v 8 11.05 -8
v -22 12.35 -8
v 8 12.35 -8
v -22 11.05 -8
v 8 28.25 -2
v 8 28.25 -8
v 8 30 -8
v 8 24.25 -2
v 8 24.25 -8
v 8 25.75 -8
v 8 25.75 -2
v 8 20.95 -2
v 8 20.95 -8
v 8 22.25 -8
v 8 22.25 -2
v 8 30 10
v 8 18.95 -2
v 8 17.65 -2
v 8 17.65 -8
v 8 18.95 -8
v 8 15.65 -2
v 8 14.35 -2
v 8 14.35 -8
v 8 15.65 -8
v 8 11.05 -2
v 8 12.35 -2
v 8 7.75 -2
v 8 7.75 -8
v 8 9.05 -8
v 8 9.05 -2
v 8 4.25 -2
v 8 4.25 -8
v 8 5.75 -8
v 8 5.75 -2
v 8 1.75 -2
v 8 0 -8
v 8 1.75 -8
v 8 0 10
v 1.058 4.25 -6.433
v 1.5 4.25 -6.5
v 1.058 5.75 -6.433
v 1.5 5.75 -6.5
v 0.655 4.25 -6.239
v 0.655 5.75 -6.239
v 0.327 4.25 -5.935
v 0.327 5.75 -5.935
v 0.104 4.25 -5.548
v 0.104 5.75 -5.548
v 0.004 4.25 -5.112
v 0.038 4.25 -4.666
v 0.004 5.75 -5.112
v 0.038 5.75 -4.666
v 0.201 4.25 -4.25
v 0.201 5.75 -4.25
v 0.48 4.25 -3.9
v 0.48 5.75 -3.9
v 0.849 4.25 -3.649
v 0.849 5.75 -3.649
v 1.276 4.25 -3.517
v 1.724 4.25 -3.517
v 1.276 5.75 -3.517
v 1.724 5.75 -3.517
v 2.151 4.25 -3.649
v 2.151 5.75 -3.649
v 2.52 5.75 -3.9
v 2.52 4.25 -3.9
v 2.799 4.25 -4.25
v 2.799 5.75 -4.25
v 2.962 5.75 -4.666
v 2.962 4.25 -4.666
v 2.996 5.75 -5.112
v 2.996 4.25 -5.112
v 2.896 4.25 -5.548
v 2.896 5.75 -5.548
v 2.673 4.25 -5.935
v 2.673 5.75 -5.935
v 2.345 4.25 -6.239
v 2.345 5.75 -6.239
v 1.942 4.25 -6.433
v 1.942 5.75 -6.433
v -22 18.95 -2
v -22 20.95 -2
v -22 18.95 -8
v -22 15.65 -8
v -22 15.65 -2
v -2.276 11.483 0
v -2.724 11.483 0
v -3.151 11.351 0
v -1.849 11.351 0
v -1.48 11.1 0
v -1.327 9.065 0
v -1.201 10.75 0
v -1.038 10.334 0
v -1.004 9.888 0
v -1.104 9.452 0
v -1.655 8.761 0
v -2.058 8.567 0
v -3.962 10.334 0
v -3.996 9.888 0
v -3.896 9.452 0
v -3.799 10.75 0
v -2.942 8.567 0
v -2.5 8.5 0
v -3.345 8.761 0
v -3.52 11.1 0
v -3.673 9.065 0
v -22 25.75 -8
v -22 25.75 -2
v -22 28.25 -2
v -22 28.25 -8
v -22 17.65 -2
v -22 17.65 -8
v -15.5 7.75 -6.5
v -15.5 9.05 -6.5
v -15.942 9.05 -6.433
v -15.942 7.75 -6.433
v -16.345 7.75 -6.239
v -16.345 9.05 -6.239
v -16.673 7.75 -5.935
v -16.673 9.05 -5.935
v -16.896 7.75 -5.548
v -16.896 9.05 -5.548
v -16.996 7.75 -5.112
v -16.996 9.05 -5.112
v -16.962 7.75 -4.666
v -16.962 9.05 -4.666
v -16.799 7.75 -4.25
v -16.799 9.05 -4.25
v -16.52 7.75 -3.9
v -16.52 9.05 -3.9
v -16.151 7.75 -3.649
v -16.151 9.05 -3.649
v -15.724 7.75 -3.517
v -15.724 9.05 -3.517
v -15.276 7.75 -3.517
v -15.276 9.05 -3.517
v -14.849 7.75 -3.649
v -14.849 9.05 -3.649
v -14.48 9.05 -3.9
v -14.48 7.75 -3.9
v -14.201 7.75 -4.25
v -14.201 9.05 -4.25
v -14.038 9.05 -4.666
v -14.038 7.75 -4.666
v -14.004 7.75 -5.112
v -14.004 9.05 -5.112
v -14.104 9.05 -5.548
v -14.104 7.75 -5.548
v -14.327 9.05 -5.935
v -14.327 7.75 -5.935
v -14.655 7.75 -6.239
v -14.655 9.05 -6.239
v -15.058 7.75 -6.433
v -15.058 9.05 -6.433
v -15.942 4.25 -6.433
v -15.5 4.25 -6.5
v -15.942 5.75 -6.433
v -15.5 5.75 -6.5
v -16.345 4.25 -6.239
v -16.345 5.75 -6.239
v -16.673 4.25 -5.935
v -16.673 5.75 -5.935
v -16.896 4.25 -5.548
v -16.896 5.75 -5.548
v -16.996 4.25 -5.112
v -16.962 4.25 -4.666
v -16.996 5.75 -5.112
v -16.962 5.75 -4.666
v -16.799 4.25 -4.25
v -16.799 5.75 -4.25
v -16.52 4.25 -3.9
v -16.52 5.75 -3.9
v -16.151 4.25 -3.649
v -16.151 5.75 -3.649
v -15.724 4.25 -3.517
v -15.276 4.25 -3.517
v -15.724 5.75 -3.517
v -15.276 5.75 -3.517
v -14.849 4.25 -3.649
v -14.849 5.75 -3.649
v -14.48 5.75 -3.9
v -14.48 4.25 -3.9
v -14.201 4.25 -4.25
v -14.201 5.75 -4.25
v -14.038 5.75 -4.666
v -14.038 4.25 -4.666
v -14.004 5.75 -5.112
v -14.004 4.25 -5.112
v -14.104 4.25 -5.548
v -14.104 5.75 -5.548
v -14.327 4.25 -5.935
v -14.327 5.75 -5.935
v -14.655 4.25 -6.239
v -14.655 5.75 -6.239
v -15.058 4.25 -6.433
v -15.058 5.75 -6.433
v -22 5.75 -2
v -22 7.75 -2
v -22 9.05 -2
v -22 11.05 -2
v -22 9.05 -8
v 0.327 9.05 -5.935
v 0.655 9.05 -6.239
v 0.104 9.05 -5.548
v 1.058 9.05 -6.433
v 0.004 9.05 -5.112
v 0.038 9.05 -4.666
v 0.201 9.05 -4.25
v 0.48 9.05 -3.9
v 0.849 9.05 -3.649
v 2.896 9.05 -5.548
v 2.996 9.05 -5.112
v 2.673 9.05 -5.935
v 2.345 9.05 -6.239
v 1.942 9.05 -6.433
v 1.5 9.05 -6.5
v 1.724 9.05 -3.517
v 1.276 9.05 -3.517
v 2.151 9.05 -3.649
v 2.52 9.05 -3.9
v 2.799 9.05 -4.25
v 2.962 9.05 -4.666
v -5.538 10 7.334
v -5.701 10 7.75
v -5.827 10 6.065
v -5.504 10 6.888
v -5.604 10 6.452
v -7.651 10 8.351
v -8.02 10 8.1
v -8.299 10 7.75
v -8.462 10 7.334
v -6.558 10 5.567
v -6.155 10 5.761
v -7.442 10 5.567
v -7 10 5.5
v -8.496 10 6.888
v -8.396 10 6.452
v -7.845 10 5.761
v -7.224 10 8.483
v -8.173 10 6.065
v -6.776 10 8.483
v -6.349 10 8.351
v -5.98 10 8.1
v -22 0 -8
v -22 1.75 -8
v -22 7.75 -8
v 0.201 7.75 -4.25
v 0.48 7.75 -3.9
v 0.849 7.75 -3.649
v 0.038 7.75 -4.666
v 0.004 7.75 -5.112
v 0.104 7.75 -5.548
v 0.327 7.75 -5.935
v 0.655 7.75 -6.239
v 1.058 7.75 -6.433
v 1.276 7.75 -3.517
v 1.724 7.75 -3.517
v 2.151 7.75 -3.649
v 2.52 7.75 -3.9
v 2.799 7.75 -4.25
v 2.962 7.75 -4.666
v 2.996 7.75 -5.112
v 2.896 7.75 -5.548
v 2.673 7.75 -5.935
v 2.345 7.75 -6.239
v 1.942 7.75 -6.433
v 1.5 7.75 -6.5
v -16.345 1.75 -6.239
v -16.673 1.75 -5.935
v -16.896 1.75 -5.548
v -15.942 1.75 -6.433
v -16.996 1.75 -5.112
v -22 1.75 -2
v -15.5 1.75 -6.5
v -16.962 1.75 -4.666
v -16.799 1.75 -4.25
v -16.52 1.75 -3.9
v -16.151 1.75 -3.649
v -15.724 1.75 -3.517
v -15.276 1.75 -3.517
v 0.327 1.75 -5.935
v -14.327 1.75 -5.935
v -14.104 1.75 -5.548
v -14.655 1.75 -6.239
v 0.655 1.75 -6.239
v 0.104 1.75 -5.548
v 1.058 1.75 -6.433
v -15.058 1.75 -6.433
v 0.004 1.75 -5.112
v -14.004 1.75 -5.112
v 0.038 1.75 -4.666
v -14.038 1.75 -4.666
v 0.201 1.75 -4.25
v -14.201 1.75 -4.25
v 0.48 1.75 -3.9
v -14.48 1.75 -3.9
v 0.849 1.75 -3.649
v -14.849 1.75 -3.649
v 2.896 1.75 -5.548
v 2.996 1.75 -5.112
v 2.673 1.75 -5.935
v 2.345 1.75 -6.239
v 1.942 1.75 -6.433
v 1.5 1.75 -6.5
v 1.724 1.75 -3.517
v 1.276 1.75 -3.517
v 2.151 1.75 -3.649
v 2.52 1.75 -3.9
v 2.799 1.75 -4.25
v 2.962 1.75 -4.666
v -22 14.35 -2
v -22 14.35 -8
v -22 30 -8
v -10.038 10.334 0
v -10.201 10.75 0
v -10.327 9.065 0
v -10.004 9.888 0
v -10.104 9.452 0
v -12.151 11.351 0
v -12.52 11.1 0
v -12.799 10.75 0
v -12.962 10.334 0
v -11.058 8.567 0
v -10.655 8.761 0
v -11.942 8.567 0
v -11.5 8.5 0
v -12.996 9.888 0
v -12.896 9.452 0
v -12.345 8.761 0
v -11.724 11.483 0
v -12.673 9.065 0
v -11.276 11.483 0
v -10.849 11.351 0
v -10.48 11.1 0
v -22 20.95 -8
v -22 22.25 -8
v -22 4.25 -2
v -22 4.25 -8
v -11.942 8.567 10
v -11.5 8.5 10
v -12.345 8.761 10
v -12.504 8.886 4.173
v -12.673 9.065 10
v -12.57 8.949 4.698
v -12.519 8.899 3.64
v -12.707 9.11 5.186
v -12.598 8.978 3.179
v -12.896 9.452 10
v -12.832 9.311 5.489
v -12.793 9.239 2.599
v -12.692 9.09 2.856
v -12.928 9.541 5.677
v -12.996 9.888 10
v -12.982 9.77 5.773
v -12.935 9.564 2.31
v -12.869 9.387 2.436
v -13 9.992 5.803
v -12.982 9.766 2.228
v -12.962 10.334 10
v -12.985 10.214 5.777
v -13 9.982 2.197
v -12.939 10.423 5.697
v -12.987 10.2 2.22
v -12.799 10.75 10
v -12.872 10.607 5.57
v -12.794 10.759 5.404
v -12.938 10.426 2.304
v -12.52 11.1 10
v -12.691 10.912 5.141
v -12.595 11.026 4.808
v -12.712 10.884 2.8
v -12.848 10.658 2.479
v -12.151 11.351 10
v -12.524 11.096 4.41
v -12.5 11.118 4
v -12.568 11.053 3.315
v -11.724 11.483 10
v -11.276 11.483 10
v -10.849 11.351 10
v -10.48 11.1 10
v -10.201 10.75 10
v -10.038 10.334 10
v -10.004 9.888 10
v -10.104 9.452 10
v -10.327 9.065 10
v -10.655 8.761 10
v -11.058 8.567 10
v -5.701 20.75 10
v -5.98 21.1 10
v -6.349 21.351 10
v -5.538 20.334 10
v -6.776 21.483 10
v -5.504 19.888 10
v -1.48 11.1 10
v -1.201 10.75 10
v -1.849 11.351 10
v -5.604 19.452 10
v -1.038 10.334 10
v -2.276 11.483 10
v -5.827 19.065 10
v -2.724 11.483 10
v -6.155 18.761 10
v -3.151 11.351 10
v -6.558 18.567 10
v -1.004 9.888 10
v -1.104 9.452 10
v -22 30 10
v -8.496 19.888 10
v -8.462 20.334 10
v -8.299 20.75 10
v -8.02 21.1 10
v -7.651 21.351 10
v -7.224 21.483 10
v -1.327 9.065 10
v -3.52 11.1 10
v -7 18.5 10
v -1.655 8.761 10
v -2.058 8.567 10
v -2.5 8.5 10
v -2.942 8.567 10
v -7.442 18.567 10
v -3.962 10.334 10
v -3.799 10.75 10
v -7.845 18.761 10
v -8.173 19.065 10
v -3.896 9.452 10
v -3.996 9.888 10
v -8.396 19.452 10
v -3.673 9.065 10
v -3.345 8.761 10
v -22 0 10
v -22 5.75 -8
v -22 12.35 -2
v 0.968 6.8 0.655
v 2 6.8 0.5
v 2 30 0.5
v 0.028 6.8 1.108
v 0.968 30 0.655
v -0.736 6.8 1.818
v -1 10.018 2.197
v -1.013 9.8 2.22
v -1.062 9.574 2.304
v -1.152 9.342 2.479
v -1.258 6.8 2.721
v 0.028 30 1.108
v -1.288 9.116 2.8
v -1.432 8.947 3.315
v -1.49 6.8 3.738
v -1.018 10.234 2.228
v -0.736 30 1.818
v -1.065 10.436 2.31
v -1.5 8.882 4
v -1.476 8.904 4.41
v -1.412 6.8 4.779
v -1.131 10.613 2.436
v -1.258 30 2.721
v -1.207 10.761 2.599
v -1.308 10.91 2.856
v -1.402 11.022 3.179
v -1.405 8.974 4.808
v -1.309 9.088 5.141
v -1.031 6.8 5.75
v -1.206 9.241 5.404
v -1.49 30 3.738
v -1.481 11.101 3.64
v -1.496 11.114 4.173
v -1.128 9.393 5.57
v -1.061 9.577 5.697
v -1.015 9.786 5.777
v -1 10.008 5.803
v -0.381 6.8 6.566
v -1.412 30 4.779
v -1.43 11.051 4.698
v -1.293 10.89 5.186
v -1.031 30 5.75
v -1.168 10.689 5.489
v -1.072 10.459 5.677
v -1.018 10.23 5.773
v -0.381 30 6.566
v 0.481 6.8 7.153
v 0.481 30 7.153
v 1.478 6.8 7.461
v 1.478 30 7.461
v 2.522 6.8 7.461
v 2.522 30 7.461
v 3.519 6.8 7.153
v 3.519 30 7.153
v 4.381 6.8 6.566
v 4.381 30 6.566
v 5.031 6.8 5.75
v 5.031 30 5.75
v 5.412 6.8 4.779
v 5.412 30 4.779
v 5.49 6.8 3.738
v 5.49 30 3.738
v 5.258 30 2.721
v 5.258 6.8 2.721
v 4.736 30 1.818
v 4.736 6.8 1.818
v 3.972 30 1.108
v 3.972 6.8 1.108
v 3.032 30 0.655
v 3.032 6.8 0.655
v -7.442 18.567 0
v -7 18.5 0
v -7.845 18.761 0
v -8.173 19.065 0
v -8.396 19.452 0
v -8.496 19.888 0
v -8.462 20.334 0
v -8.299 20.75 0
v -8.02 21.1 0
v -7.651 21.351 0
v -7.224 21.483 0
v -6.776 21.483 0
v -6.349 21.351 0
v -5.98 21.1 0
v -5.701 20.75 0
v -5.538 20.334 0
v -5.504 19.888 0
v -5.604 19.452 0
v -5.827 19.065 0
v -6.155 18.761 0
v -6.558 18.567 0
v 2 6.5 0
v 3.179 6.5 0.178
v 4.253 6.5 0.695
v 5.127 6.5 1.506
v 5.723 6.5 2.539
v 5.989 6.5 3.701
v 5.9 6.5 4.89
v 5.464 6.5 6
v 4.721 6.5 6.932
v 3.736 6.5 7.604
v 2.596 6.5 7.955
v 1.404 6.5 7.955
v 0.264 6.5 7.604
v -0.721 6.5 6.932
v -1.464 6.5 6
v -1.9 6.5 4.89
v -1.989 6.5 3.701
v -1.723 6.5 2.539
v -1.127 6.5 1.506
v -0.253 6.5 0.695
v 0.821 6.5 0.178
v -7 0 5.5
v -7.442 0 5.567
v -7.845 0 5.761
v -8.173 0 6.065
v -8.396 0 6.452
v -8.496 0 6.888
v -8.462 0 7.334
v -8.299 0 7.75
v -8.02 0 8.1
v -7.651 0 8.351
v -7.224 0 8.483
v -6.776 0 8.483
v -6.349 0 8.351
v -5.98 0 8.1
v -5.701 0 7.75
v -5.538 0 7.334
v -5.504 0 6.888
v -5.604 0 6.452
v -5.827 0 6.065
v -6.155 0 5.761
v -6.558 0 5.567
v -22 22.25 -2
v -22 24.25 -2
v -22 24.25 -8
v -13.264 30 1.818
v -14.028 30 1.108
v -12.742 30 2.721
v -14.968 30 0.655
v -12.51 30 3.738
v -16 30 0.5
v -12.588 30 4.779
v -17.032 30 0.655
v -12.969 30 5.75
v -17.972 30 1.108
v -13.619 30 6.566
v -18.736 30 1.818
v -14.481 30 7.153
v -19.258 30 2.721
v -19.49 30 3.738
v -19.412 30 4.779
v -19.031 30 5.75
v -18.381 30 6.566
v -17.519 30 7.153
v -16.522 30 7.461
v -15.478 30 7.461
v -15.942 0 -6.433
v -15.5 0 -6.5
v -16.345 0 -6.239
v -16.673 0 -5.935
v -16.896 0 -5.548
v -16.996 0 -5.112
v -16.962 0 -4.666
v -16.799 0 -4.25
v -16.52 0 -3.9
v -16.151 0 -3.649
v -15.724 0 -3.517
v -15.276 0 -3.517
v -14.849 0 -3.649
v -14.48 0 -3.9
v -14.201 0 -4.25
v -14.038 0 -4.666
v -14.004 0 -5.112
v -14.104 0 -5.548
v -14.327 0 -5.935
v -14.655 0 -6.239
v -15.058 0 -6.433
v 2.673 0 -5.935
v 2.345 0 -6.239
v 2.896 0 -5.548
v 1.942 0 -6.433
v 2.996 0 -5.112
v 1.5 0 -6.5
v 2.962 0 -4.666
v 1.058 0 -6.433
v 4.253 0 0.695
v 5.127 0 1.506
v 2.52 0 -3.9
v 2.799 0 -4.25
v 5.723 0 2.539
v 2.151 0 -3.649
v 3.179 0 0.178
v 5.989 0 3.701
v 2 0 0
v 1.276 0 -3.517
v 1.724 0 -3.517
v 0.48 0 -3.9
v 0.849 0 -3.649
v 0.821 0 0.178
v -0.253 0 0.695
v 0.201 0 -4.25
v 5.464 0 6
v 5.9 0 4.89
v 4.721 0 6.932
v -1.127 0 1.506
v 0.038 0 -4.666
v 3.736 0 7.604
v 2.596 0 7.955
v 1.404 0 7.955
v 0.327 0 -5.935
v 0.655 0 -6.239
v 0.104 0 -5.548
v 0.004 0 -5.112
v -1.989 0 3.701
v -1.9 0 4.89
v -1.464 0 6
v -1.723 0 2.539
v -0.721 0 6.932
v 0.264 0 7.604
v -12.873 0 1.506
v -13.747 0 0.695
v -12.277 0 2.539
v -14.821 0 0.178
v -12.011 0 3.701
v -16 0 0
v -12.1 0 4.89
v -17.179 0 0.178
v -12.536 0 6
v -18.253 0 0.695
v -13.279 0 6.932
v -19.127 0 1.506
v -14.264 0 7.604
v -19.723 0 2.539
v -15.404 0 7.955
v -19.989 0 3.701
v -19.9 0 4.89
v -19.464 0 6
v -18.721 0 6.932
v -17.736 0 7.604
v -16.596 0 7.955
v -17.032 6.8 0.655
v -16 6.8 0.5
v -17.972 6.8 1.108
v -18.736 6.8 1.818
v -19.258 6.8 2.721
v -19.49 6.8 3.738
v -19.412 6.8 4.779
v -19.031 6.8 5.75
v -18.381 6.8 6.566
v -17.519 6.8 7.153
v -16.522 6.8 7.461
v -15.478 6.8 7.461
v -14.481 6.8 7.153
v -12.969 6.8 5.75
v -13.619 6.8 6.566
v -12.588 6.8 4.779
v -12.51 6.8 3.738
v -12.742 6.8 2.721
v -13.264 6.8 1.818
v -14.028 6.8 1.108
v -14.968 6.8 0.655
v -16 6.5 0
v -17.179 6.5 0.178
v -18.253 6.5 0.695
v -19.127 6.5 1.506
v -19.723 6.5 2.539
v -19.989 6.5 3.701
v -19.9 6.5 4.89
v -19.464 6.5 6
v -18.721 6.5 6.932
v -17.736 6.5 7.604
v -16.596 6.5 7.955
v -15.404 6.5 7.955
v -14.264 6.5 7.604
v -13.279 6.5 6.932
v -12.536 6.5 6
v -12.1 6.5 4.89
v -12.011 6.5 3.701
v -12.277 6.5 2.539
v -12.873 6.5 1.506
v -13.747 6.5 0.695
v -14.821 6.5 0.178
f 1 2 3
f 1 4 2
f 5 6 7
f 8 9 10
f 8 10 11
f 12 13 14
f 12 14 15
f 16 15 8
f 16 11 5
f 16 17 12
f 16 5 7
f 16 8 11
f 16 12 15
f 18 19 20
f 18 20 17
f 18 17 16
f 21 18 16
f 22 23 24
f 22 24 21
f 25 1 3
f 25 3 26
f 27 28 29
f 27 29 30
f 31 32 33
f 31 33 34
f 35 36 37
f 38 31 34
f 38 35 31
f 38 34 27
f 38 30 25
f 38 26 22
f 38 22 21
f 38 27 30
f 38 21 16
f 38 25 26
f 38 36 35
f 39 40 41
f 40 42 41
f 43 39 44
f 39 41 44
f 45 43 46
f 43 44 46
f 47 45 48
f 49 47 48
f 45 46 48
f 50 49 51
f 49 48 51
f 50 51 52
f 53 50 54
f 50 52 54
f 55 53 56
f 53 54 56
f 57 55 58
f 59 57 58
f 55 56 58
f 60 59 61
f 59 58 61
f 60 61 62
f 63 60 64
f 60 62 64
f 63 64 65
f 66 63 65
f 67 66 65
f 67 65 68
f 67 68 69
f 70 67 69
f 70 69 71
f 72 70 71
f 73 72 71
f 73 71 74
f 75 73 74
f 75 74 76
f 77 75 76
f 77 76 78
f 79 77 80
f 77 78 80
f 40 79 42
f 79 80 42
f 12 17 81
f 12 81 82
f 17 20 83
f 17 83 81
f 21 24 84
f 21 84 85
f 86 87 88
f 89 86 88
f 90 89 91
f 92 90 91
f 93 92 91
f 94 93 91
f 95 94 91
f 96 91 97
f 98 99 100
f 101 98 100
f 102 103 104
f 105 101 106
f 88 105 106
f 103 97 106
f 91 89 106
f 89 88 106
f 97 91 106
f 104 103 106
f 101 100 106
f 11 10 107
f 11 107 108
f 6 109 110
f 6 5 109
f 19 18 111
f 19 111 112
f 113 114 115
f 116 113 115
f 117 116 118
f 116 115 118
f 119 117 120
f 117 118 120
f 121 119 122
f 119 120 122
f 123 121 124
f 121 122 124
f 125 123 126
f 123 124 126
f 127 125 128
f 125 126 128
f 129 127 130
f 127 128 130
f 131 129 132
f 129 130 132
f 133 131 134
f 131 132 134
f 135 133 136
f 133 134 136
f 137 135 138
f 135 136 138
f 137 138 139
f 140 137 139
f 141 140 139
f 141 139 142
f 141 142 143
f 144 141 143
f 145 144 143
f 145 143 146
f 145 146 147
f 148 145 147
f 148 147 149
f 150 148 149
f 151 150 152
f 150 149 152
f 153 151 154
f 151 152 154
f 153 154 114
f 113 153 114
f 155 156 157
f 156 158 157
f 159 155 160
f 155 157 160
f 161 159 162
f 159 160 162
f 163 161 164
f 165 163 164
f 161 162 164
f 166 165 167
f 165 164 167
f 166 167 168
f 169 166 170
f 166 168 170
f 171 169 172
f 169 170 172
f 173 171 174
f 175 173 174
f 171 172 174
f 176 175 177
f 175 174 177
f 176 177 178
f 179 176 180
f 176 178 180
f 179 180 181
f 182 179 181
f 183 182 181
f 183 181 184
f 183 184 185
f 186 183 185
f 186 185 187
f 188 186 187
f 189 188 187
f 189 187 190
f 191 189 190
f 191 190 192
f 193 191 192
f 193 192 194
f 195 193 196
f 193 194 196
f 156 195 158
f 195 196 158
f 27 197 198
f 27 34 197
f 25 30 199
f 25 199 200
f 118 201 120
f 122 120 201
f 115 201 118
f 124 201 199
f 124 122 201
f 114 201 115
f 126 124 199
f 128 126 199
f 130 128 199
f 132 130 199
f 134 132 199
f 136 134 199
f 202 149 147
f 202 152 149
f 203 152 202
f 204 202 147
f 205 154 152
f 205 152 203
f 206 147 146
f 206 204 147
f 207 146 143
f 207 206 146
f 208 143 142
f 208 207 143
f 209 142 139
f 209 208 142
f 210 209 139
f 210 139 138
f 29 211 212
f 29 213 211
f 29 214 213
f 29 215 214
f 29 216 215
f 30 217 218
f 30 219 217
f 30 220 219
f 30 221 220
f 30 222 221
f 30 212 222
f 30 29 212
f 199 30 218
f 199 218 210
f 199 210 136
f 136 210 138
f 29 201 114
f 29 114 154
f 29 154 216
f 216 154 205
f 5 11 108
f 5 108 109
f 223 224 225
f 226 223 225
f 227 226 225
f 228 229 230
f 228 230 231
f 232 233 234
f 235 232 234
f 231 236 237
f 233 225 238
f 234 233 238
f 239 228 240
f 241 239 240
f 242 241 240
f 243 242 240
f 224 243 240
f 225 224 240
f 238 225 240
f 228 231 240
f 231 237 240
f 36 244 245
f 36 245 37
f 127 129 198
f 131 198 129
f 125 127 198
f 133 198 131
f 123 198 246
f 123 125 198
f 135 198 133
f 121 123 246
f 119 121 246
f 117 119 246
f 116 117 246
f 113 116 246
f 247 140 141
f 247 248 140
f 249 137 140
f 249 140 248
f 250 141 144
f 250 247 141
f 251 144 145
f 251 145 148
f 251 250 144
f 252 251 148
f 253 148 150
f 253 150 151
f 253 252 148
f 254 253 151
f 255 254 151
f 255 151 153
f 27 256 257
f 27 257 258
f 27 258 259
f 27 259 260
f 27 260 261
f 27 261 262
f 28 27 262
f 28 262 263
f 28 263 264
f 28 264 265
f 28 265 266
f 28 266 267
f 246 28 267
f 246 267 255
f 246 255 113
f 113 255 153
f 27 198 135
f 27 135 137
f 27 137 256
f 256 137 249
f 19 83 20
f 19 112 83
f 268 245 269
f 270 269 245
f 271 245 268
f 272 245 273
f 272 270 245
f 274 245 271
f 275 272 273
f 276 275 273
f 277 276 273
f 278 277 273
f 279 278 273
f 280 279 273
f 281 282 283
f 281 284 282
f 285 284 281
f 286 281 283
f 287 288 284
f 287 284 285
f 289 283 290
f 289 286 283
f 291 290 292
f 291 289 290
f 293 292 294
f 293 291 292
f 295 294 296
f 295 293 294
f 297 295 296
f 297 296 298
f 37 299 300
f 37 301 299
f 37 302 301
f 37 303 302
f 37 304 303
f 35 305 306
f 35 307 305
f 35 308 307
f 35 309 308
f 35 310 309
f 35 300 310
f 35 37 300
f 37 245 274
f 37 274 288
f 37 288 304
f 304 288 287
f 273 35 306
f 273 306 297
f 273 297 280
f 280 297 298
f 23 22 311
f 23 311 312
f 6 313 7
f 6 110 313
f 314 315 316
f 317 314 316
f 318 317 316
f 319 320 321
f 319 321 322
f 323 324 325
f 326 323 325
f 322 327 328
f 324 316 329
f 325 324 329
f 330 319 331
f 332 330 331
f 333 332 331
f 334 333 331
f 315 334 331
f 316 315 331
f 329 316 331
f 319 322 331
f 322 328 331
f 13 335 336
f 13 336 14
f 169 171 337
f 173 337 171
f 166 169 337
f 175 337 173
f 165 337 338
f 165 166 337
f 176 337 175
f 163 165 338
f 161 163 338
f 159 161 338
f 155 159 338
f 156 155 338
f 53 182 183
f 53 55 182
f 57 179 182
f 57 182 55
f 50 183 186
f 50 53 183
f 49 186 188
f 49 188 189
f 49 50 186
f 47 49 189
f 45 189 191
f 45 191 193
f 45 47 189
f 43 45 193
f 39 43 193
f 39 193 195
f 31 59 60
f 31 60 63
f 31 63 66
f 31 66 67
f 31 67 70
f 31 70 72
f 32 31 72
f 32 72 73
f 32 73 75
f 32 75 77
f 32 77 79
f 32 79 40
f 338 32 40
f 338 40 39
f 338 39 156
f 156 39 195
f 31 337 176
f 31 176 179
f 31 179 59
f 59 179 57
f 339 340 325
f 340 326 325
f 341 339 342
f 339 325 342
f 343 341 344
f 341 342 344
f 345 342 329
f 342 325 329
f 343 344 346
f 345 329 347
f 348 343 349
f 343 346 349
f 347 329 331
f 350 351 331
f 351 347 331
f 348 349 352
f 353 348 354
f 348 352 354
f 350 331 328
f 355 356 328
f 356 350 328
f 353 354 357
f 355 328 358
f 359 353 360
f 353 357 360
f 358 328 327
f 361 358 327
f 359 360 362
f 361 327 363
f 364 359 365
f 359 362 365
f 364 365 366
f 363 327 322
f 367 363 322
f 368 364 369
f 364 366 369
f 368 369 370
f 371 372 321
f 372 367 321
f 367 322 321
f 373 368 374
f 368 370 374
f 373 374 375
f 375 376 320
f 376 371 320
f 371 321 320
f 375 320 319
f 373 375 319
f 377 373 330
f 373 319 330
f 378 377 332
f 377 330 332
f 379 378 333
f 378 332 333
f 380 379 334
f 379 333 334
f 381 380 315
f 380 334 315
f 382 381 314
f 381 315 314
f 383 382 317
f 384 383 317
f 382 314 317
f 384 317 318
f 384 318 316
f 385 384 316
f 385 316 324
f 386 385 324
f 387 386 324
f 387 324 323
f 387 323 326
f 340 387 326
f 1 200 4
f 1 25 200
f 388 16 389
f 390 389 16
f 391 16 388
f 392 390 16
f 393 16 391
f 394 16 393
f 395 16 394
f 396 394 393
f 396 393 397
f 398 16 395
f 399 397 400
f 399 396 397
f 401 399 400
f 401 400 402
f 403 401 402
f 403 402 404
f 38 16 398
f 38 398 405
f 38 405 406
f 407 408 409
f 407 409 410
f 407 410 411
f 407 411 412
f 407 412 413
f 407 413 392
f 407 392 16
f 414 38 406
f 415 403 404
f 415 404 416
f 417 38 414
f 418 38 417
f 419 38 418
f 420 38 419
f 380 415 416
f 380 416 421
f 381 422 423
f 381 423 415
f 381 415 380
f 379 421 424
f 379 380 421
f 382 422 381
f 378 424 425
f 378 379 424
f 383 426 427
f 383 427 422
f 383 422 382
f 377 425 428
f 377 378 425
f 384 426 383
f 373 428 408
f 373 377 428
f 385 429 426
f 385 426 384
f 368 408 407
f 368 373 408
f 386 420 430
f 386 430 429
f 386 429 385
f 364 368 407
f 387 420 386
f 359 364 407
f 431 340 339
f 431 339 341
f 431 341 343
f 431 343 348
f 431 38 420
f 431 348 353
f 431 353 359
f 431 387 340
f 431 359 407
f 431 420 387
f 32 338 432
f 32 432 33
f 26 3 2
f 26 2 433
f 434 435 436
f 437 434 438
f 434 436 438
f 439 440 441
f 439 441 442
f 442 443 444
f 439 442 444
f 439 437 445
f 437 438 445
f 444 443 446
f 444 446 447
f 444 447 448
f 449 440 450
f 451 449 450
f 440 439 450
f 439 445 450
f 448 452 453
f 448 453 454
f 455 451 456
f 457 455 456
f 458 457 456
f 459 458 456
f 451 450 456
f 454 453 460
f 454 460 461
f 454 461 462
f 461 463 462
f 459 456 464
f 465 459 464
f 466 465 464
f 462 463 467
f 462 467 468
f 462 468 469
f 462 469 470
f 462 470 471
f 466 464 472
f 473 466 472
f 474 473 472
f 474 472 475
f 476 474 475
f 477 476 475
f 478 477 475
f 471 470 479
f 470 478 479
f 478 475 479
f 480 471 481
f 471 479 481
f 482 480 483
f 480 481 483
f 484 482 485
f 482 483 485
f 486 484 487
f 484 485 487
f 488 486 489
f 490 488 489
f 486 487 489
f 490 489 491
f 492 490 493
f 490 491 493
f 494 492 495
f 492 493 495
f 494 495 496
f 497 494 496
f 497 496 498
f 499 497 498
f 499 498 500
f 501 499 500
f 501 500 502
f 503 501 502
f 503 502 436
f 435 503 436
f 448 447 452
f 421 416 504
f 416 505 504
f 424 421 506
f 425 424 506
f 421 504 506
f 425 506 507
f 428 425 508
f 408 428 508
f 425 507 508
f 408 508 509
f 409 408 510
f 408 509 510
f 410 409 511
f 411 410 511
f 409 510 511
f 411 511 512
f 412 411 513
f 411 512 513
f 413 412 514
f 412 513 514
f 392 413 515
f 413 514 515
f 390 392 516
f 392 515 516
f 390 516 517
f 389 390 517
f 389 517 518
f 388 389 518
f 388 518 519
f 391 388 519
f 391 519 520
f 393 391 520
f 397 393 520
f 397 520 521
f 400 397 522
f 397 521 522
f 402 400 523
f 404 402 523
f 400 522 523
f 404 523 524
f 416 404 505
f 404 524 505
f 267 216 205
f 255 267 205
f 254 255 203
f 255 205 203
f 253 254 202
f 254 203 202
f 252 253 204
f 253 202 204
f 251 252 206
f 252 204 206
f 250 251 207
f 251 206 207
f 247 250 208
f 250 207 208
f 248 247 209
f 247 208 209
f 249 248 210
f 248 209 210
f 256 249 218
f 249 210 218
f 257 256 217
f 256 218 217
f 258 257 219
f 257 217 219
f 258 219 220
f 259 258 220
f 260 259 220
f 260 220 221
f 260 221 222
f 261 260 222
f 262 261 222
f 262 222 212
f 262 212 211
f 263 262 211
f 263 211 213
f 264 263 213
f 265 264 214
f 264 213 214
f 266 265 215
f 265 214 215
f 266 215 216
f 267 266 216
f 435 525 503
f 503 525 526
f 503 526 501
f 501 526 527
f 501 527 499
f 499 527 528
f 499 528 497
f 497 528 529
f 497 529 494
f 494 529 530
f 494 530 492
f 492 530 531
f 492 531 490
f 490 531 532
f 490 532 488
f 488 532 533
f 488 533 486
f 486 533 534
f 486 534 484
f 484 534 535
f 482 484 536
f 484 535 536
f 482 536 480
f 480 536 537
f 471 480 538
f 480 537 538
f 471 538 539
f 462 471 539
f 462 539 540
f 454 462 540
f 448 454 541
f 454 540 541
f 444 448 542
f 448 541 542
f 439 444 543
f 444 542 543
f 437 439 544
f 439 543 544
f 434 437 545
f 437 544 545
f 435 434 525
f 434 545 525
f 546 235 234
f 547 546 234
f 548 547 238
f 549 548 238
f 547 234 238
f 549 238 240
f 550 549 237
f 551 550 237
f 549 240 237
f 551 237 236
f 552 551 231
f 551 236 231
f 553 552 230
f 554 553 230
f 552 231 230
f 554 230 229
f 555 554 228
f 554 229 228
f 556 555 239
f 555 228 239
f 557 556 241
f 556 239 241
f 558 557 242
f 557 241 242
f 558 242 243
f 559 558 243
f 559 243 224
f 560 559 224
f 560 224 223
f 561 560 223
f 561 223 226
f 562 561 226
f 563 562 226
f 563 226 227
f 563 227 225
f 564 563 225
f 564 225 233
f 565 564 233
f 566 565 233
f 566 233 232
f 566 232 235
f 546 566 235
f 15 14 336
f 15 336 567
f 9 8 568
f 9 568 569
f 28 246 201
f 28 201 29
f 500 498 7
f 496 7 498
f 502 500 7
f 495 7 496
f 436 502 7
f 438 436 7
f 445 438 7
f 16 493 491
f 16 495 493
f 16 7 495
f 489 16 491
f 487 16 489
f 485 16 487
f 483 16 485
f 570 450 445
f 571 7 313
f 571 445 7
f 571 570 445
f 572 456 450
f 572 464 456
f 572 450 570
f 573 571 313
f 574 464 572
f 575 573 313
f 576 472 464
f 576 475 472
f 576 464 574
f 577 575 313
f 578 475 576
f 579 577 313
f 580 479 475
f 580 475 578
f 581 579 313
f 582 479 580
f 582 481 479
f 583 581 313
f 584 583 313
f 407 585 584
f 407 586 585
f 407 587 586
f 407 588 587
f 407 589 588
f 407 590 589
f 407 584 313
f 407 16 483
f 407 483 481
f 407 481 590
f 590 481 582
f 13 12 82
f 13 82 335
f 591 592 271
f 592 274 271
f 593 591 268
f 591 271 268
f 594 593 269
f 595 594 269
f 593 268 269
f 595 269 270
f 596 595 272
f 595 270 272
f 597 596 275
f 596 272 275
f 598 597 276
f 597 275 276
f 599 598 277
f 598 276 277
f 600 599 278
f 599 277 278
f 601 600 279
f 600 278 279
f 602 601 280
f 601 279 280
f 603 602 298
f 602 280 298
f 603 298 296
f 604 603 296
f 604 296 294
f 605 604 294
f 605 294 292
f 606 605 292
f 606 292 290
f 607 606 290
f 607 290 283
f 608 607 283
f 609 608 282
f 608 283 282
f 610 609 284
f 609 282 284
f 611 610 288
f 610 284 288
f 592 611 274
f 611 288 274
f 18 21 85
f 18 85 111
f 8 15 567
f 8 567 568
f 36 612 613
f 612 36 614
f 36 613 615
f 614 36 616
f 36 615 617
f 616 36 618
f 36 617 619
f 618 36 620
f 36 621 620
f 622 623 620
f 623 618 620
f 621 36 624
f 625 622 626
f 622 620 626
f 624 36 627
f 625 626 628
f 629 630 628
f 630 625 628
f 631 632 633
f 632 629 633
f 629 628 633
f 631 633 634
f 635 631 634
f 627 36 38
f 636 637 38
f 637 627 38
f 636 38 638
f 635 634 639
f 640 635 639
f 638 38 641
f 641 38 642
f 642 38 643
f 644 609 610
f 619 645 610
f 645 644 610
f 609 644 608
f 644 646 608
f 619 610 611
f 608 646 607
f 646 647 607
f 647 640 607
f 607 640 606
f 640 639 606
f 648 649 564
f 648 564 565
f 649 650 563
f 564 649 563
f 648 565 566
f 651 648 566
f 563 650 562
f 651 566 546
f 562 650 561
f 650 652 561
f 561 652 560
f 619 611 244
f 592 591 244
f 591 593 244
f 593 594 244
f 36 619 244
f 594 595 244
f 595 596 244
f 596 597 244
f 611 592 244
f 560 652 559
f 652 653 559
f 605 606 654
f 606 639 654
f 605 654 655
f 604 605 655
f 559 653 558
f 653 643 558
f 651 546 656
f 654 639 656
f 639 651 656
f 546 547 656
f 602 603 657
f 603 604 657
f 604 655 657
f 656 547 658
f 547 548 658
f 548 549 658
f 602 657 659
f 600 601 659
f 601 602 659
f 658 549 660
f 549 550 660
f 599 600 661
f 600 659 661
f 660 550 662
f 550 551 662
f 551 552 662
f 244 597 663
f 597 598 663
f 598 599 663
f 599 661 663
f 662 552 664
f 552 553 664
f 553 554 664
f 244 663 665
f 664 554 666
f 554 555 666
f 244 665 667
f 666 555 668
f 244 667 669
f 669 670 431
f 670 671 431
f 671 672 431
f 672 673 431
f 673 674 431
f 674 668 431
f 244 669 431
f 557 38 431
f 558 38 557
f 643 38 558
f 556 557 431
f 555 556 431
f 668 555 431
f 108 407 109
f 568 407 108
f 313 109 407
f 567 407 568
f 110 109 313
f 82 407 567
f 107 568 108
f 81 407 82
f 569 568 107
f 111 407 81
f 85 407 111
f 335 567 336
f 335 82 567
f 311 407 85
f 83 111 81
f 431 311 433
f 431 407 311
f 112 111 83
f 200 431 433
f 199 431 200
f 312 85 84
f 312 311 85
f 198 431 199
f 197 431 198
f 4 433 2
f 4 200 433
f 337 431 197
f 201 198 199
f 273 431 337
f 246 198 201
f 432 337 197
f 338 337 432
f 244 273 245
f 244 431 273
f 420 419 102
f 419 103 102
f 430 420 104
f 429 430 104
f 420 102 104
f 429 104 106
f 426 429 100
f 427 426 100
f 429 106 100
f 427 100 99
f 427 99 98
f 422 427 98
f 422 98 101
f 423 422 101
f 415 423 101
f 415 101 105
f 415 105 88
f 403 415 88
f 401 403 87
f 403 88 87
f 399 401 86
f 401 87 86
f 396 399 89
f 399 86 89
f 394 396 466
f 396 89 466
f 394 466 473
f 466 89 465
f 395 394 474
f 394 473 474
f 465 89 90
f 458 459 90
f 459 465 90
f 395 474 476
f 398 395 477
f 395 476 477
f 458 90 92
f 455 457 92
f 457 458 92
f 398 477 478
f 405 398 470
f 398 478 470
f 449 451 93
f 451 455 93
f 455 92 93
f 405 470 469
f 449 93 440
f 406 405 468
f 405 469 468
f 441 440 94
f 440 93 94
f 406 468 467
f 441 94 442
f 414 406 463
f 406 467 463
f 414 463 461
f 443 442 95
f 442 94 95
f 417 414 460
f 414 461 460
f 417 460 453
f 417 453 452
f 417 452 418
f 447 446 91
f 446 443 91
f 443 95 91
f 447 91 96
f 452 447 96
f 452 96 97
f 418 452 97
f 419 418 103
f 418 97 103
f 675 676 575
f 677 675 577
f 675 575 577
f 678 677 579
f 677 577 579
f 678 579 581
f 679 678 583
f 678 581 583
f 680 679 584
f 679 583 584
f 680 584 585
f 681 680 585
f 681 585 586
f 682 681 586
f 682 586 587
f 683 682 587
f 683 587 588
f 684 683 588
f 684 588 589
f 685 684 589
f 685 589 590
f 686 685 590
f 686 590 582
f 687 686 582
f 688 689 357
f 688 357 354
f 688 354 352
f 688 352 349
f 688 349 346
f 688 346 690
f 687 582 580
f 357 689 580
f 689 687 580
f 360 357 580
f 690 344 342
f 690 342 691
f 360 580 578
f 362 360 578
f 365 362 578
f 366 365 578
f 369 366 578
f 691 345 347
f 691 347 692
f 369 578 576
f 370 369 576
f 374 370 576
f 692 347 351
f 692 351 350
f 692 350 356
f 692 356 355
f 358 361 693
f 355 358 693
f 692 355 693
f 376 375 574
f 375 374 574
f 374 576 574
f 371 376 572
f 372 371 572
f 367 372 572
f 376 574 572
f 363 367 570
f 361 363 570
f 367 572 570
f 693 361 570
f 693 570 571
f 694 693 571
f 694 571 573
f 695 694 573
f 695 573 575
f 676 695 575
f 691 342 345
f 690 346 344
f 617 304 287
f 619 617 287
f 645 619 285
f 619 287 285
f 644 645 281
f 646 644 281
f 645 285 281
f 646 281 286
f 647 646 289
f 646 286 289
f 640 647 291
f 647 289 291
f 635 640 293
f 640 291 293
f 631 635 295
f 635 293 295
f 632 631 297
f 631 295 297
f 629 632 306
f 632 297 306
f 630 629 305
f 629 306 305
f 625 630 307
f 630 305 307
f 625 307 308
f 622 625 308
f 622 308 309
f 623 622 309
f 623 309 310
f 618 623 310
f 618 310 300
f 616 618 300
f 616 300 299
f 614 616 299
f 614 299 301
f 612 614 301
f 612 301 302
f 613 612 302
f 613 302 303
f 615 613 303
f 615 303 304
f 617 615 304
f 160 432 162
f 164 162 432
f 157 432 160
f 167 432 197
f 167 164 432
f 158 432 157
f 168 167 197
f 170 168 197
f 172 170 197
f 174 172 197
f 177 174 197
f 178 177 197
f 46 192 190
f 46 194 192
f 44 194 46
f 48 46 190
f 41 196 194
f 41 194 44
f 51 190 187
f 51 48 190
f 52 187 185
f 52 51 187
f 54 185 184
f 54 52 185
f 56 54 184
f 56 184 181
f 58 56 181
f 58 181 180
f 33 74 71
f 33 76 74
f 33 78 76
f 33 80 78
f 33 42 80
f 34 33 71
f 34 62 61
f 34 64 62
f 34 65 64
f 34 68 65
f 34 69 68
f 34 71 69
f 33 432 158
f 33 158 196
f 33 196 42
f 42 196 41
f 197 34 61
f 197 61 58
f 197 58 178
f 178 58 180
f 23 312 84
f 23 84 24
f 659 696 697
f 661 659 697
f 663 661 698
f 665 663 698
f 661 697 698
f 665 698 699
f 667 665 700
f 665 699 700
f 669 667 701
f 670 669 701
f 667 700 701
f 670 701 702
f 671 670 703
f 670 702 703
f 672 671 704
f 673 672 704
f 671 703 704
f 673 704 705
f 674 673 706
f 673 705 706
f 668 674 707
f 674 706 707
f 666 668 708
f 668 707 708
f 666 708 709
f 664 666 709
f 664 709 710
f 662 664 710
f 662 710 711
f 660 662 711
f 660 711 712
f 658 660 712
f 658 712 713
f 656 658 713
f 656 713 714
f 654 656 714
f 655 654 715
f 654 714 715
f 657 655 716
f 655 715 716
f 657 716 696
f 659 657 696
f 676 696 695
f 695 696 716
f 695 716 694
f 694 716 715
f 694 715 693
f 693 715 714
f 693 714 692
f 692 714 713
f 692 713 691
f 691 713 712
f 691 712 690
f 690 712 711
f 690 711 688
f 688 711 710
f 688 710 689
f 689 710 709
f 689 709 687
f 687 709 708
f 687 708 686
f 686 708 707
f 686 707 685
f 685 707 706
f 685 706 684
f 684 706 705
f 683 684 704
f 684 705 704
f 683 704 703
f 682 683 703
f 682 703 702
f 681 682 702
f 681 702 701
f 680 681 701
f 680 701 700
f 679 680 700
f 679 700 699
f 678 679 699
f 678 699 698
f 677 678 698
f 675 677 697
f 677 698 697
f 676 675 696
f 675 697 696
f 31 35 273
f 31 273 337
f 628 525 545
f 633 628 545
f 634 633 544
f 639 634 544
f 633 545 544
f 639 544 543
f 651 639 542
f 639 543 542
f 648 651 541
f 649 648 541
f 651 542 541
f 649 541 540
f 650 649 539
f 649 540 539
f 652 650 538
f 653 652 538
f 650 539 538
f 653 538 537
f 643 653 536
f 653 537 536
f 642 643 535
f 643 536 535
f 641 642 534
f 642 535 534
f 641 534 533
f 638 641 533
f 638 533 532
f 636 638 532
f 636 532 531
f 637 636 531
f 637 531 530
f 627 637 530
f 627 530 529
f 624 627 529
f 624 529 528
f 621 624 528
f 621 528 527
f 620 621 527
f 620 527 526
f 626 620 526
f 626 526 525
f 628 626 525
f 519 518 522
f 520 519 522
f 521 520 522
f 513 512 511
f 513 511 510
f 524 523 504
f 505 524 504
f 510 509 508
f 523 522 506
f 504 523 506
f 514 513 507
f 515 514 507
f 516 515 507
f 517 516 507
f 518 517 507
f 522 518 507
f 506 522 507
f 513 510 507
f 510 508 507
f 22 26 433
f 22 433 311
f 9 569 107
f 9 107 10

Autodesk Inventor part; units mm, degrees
ref_plane "YZ Plane" through (0, 0, 0) normal (1, 0, 0) x (0, 1, 0)
ref_plane "XZ Plane" through (0, 0, 0) normal (0, 1, 0) x (-1, 0, 0)
ref_plane "XY Plane" through (0, 0, 0) normal (0, 0, 1) x (1, 0, 0)
sketch "Sketch2" plane through (0, 0, 0) normal (0, 1, 0) x (-1, 0, 0)
  line L0 (-8, 10) -> (22, 10)
  line L1 (22, 10) -> (22, -8)
  line L2 (22, -8) -> (-8, -8)
  line L3 (-8, -8) -> (-8, 10)
  point P0 (0, 0)
  point P1 (-2, 4)
  point P2 (16, 4)
  point P3 (7, 7)
  point P4 (15.5, -5)
  point P5 (-1.5, -5)
  dimension "d0" = 30
  dimension "d1" = 18
  dimension "d2" = 6
  dimension "d3" = 6
  dimension "d4" = 6
  dimension "d5" = 6
  dimension "d40" = 15
  dimension "d41" = 3
  dimension "d42" = 6.5
  dimension "d43" = 6.5
  dimension "d44" = 3
  dimension "d45" = 3
extrude "Extrusion1" add sketch "Sketch2" along normal blind 30
hole "Hole1" at (2, 0, 4) at (-16, 0, 4) direction (0, 1, 0) diameter 7 end through all
hole "Hole2" at (-16, 0, 4) at (2, 0, 4) direction (0, 1, 0) diameter 8 depth 6.5 tip angle 118
sketch "Sketch3" plane through (8, 0, 10) normal (1, 0, 0) x (0, 0, -1)
  line L0 (18, 1.75) -> (12, 1.75)
  line L1 (12, 1.75) -> (12, 4.25)
  line L2 (12, 4.25) -> (18, 4.25)
  line L3 (18, 4.25) -> (18, 1.75)
  line L4 (18, 0) -> (0, 0) projected
  line L5 (18, 5.75) -> (12, 5.75)
  line L6 (12, 5.75) -> (12, 7.75)
  line L7 (12, 7.75) -> (18, 7.75)
  line L8 (18, 7.75) -> (18, 5.75)
  line L9 (18, 25.75) -> (12, 25.75)
  line L10 (12, 25.75) -> (12, 28.25)
  line L11 (12, 28.25) -> (18, 28.25)
  line L12 (18, 28.25) -> (18, 25.75)
  line L13 (18, 9.05) -> (12, 9.05)
  line L14 (12, 9.05) -> (12, 11.05)
  line L15 (12, 11.05) -> (18, 11.05)
  line L16 (18, 11.05) -> (18, 9.05)
  line L17 (18, 12.35) -> (12, 12.35)
  line L18 (12, 12.35) -> (12, 14.35)
  line L19 (12, 14.35) -> (18, 14.35)
  line L20 (18, 14.35) -> (18, 12.35)
  line L21 (18, 15.65) -> (12, 15.65)
  line L22 (12, 15.65) -> (12, 17.65)
  line L23 (12, 17.65) -> (18, 17.65)
  line L24 (18, 17.65) -> (18, 15.65)
  line L25 (18, 18.95) -> (12, 18.95)
  line L26 (12, 18.95) -> (12, 20.95)
  line L27 (12, 20.95) -> (18, 20.95)
  line L28 (18, 20.95) -> (18, 18.95)
  line L29 (18, 22.25) -> (12, 22.25)
  line L30 (12, 22.25) -> (12, 24.25)
  line L31 (12, 24.25) -> (18, 24.25)
  line L32 (18, 24.25) -> (18, 22.25)
  line L33 (0, 30) -> (18, 30) projected
  point P0 (10, 0)
  dimension "d22" = 6
  dimension "d23" = 2.5
  dimension "d24" = 1.75
  dimension "d25" = 6
  dimension "d26" = 2
  dimension "d27" = 1.5
  dimension "d36" = 6
  dimension "d37" = 2.5
  dimension "d46" = 6
  dimension "d47" = 2
  dimension "d48" = 1.3
  dimension "d49" = 6
  dimension "d50" = 2
  dimension "d51" = 6
  dimension "d52" = 2
  dimension "d53" = 6
  dimension "d54" = 2
  dimension "d55" = 6
  dimension "d56" = 2
  dimension "d57" = 1.75
  dimension "d58" = 1.5
extrude "Extrusion3" cut sketch "Sketch3" against normal blind 30
hole "Hole3" at (-7, 0, 7) at (-15.5, 0, -5) at (1.5, 0, -5) direction (0, 1, 0) diameter 3 depth 10
thread "Thread1" size "M3x0.5" class "6H" standard "ANSI Metric M Profile" full length
thread "Thread2" size "M3x0.5" class "6H" standard "ANSI Metric M Profile" full length
thread "Thread3" size "M3x0.5" class "6H" standard "ANSI Metric M Profile" full length
sketch "Sketch4" plane through (-22, 0, 10) normal (0, 0, 1) x (1, 0, 0)
  line L0 (30, 0) -> (30, 30) projected
  line L1 (0, 30) -> (30, 30) projected
  point P0 (22, 0)
  point P1 (19.5, 10)
  point P2 (10.5, 10)
  point P3 (15, 20)
  dimension "d74" = 10.5
  dimension "d75" = 15
  dimension "d76" = 19.5
  dimension "d77" = 20
  dimension "d78" = 10
hole "Hole4" at (-2.5, 10, 10) at (-11.5, 10, 10) at (-7, 20, 10) direction (0, 0, -1) diameter 3 depth 10
thread "Thread4" size "M3x0.5" class "6H" standard "ANSI Metric M Profile" full length
thread "Thread5" size "M3x0.5" class "6H" standard "ANSI Metric M Profile" full length
thread "Thread6" size "M3x0.5" class "6H" standard "ANSI Metric M Profile" full length
properties part number "Chimera Heatsink" material "Aluminum 6061, Welded"
